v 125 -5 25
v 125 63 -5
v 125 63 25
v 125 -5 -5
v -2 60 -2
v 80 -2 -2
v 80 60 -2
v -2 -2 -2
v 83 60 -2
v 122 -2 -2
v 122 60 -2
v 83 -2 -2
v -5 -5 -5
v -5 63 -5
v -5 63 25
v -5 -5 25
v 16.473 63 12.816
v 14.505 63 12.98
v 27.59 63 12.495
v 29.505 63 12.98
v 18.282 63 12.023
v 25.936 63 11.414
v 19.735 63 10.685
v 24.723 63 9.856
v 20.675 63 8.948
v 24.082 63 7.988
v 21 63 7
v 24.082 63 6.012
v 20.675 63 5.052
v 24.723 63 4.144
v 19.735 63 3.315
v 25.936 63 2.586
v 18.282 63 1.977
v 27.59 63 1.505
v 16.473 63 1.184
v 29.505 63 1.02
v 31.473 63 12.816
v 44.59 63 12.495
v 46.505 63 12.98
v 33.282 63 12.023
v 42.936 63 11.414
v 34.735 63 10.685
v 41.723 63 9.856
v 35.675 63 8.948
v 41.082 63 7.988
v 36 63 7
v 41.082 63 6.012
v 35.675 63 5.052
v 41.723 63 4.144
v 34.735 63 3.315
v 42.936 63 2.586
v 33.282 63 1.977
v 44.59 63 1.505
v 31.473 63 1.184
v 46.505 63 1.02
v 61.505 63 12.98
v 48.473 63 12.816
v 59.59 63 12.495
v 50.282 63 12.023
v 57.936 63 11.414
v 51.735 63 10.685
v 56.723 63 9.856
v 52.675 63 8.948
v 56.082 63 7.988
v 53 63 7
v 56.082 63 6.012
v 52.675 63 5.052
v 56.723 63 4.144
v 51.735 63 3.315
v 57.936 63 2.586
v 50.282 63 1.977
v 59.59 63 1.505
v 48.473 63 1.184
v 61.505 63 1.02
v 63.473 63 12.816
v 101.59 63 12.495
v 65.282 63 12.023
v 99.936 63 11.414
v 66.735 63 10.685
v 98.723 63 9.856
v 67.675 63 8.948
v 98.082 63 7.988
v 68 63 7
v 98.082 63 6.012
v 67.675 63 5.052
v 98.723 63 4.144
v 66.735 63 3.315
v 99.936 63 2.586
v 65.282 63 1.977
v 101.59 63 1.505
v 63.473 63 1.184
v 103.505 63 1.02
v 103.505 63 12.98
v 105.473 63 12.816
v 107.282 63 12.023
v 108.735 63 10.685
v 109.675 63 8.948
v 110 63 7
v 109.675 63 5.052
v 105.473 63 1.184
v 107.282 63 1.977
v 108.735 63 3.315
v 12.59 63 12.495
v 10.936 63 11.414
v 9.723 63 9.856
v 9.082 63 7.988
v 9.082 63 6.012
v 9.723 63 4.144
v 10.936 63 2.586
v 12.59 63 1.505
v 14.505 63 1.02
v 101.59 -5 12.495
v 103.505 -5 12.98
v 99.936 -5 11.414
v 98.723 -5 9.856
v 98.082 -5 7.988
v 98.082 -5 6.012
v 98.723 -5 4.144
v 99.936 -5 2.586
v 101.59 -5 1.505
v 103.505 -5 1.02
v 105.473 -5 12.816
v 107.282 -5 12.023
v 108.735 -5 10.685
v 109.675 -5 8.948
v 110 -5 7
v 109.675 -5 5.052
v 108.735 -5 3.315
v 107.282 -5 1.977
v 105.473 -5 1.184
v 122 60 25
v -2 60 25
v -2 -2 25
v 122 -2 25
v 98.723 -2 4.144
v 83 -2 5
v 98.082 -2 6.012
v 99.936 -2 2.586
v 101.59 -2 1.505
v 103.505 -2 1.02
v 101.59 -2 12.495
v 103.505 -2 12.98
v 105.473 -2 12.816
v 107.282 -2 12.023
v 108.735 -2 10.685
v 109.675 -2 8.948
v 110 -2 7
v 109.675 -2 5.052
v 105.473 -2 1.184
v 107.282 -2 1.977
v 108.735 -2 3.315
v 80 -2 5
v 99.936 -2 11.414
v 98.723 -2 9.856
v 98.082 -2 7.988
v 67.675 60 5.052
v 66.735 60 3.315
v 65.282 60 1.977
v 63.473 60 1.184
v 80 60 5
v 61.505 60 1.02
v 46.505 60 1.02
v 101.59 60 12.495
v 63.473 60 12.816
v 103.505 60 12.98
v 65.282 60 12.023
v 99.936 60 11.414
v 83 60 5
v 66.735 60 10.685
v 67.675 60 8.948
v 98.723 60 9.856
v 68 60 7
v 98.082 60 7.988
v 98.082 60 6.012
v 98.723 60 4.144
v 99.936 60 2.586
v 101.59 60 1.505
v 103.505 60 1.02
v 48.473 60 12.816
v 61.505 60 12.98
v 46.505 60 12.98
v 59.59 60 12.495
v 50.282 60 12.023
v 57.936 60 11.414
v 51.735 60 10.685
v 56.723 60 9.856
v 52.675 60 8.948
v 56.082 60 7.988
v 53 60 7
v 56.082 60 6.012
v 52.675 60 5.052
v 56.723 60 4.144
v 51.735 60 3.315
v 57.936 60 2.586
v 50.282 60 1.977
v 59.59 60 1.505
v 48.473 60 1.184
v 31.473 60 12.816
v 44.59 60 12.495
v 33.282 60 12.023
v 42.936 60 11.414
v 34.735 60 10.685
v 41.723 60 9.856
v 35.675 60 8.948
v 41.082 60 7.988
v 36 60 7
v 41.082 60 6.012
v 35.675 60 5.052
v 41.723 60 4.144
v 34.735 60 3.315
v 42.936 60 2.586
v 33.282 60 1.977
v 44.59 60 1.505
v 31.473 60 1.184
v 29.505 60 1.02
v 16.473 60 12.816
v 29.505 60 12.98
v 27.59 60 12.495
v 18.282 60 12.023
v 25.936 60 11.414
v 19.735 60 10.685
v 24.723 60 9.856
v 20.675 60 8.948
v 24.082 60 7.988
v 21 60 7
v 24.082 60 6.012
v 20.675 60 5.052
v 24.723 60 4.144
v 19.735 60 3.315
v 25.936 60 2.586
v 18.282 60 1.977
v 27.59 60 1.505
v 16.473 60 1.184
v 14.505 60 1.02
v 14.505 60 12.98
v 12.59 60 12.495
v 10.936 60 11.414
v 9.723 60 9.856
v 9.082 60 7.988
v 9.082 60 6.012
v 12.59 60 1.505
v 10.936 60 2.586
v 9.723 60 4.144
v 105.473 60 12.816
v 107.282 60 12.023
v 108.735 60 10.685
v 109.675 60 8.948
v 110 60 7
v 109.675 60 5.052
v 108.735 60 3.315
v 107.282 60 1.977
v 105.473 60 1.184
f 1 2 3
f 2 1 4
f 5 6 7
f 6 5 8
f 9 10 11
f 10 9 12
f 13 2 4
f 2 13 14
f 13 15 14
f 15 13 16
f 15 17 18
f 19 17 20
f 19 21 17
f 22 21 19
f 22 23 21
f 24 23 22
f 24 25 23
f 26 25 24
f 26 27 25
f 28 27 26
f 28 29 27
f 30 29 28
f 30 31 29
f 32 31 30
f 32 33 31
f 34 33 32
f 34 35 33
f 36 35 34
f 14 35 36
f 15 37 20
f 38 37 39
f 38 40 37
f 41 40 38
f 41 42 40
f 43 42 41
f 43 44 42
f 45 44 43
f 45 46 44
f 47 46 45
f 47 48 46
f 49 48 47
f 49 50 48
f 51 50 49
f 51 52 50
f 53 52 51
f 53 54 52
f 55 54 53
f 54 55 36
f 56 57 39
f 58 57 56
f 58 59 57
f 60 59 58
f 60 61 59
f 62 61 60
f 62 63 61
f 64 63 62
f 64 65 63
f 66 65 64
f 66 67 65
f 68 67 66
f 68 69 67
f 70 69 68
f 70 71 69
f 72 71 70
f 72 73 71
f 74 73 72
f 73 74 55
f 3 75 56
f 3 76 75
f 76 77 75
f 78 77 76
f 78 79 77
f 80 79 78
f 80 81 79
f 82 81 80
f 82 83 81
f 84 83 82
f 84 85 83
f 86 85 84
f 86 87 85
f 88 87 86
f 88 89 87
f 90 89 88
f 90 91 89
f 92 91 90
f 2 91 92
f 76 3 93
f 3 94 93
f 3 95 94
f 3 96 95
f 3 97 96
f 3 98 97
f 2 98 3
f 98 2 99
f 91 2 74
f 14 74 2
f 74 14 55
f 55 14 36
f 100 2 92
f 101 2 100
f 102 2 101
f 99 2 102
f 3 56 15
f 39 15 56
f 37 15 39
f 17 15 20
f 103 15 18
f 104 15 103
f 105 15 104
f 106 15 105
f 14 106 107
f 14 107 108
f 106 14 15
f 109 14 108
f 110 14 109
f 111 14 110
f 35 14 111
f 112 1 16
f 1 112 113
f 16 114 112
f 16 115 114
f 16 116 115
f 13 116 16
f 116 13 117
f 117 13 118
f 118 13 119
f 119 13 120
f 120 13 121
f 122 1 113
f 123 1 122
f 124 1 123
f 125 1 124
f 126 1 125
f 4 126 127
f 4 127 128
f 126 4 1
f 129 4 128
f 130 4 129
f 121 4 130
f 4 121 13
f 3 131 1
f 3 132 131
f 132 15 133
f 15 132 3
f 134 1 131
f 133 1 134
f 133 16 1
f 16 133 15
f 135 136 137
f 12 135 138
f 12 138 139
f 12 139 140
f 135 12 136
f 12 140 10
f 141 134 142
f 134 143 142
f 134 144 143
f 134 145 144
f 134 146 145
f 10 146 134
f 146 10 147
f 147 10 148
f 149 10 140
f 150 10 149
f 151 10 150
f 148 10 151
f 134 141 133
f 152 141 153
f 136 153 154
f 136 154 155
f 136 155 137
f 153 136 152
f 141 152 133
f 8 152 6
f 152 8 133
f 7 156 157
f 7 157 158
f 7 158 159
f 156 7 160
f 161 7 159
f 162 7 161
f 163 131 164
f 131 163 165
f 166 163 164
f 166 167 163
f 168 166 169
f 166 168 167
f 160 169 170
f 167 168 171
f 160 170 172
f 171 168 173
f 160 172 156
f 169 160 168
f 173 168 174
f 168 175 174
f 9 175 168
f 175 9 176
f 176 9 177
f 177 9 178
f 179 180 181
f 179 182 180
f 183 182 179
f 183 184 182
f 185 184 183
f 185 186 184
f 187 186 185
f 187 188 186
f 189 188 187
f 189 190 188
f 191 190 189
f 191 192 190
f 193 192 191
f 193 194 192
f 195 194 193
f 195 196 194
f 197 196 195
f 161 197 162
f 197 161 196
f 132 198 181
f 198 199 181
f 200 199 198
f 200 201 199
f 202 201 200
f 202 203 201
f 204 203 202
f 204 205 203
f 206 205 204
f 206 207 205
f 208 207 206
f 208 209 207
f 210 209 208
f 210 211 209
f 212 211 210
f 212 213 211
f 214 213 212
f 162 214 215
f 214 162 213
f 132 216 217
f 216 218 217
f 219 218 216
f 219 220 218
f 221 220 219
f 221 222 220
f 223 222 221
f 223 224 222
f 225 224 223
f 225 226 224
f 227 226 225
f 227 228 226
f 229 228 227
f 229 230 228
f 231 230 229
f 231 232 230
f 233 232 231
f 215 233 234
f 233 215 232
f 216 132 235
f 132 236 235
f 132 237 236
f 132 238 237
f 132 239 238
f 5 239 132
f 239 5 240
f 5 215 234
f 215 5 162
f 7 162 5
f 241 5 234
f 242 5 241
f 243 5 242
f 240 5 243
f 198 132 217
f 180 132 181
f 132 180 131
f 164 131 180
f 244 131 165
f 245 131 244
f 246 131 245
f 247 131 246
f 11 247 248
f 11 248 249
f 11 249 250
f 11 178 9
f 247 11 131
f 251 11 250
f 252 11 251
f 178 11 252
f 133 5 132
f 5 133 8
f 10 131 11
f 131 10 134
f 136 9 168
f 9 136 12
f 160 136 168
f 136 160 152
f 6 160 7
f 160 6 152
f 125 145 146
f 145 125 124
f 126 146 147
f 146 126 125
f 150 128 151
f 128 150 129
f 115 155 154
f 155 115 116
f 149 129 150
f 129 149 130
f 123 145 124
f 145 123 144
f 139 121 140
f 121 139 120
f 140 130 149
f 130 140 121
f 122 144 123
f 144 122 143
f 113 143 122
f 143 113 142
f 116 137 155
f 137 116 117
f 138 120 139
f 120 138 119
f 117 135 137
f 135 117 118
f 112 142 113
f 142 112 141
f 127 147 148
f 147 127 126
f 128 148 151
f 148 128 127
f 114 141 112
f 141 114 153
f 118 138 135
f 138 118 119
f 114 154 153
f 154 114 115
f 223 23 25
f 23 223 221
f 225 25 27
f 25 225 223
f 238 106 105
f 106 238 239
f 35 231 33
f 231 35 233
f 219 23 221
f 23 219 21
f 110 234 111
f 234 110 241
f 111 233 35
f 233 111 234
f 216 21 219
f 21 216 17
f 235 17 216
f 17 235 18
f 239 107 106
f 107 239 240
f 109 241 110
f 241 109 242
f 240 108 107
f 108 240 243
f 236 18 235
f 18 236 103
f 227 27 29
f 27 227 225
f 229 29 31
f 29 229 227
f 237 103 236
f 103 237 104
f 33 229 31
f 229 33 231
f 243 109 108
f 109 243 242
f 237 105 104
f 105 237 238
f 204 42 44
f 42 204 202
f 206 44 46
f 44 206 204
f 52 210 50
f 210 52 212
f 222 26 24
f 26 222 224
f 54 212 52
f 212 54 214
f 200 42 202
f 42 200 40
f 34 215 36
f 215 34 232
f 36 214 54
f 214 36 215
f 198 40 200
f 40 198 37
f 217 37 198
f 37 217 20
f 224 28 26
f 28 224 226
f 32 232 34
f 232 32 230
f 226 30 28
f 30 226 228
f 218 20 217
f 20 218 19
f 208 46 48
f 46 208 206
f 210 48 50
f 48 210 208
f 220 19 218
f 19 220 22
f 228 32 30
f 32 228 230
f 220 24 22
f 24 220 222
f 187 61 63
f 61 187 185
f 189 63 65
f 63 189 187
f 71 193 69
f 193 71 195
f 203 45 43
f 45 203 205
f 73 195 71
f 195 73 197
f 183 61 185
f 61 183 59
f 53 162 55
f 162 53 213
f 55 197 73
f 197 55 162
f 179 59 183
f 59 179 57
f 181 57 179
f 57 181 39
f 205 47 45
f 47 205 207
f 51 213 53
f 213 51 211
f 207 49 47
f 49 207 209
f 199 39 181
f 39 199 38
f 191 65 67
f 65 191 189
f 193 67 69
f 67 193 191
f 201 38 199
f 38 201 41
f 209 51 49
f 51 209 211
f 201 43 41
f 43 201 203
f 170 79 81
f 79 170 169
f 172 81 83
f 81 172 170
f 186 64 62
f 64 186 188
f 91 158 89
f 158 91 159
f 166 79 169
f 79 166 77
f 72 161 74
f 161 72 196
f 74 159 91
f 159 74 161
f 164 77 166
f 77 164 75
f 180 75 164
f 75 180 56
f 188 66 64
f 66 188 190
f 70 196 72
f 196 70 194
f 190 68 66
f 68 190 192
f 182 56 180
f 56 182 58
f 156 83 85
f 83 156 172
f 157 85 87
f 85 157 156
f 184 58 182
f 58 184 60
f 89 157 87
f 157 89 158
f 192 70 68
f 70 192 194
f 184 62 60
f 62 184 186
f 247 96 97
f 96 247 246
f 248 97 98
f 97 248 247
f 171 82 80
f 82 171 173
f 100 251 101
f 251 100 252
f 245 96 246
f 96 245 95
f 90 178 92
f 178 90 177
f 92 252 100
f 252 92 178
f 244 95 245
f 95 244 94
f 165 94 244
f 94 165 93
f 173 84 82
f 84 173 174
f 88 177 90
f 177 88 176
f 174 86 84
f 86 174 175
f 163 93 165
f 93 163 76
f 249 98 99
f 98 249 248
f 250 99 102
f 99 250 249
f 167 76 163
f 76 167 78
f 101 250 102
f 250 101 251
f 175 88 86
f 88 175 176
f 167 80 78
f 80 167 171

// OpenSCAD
module shitInside() {
    //relays
    cube([77,58,20]);
        
    // nodemcu
    translate([90, 0, 0])
        cube([28,50,20]);
}

module case() {
    difference() {
        union() {
            // bottom
            translate([-5,-5,-5])
                cube([130,68,3]);

            // front
            translate([-5,-5,-5])
                cube([130,3,30]);

            // back
            translate([-5,60,-5])
                cube([130,3,30]);
                
            // left
            translate([-5,-5,-5])
                cube([3,68,30]);
                
            // right
            translate([122,-5,-5])
                cube([3,68,30]);
                
            // middle
            translate([80,-5,-5])
                cube([3,68,10]);
        }
        
        union() {
            
            translate([104,2,7])
                rotate([90,0,0])
                    cylinder(10, r=6);

            translate([15,67,7])
                rotate([90,0,0])
                    cylinder(10, r=6);

            translate([30,67,7])
                rotate([90,0,0])
                    cylinder(10, r=6);


            translate([47,67,7])
                rotate([90,0,0])
                    cylinder(10, r=6);

            translate([62,67,7])
                rotate([90,0,0])
                    cylinder(10, r=6);


            translate([104,67,7])
                rotate([90,0,0])
                    cylinder(10, r=6);

        }
    }

}

/*
color("blue", 0.7)   
    shitInside();
*/

color("silver", 0.5)
    case();
